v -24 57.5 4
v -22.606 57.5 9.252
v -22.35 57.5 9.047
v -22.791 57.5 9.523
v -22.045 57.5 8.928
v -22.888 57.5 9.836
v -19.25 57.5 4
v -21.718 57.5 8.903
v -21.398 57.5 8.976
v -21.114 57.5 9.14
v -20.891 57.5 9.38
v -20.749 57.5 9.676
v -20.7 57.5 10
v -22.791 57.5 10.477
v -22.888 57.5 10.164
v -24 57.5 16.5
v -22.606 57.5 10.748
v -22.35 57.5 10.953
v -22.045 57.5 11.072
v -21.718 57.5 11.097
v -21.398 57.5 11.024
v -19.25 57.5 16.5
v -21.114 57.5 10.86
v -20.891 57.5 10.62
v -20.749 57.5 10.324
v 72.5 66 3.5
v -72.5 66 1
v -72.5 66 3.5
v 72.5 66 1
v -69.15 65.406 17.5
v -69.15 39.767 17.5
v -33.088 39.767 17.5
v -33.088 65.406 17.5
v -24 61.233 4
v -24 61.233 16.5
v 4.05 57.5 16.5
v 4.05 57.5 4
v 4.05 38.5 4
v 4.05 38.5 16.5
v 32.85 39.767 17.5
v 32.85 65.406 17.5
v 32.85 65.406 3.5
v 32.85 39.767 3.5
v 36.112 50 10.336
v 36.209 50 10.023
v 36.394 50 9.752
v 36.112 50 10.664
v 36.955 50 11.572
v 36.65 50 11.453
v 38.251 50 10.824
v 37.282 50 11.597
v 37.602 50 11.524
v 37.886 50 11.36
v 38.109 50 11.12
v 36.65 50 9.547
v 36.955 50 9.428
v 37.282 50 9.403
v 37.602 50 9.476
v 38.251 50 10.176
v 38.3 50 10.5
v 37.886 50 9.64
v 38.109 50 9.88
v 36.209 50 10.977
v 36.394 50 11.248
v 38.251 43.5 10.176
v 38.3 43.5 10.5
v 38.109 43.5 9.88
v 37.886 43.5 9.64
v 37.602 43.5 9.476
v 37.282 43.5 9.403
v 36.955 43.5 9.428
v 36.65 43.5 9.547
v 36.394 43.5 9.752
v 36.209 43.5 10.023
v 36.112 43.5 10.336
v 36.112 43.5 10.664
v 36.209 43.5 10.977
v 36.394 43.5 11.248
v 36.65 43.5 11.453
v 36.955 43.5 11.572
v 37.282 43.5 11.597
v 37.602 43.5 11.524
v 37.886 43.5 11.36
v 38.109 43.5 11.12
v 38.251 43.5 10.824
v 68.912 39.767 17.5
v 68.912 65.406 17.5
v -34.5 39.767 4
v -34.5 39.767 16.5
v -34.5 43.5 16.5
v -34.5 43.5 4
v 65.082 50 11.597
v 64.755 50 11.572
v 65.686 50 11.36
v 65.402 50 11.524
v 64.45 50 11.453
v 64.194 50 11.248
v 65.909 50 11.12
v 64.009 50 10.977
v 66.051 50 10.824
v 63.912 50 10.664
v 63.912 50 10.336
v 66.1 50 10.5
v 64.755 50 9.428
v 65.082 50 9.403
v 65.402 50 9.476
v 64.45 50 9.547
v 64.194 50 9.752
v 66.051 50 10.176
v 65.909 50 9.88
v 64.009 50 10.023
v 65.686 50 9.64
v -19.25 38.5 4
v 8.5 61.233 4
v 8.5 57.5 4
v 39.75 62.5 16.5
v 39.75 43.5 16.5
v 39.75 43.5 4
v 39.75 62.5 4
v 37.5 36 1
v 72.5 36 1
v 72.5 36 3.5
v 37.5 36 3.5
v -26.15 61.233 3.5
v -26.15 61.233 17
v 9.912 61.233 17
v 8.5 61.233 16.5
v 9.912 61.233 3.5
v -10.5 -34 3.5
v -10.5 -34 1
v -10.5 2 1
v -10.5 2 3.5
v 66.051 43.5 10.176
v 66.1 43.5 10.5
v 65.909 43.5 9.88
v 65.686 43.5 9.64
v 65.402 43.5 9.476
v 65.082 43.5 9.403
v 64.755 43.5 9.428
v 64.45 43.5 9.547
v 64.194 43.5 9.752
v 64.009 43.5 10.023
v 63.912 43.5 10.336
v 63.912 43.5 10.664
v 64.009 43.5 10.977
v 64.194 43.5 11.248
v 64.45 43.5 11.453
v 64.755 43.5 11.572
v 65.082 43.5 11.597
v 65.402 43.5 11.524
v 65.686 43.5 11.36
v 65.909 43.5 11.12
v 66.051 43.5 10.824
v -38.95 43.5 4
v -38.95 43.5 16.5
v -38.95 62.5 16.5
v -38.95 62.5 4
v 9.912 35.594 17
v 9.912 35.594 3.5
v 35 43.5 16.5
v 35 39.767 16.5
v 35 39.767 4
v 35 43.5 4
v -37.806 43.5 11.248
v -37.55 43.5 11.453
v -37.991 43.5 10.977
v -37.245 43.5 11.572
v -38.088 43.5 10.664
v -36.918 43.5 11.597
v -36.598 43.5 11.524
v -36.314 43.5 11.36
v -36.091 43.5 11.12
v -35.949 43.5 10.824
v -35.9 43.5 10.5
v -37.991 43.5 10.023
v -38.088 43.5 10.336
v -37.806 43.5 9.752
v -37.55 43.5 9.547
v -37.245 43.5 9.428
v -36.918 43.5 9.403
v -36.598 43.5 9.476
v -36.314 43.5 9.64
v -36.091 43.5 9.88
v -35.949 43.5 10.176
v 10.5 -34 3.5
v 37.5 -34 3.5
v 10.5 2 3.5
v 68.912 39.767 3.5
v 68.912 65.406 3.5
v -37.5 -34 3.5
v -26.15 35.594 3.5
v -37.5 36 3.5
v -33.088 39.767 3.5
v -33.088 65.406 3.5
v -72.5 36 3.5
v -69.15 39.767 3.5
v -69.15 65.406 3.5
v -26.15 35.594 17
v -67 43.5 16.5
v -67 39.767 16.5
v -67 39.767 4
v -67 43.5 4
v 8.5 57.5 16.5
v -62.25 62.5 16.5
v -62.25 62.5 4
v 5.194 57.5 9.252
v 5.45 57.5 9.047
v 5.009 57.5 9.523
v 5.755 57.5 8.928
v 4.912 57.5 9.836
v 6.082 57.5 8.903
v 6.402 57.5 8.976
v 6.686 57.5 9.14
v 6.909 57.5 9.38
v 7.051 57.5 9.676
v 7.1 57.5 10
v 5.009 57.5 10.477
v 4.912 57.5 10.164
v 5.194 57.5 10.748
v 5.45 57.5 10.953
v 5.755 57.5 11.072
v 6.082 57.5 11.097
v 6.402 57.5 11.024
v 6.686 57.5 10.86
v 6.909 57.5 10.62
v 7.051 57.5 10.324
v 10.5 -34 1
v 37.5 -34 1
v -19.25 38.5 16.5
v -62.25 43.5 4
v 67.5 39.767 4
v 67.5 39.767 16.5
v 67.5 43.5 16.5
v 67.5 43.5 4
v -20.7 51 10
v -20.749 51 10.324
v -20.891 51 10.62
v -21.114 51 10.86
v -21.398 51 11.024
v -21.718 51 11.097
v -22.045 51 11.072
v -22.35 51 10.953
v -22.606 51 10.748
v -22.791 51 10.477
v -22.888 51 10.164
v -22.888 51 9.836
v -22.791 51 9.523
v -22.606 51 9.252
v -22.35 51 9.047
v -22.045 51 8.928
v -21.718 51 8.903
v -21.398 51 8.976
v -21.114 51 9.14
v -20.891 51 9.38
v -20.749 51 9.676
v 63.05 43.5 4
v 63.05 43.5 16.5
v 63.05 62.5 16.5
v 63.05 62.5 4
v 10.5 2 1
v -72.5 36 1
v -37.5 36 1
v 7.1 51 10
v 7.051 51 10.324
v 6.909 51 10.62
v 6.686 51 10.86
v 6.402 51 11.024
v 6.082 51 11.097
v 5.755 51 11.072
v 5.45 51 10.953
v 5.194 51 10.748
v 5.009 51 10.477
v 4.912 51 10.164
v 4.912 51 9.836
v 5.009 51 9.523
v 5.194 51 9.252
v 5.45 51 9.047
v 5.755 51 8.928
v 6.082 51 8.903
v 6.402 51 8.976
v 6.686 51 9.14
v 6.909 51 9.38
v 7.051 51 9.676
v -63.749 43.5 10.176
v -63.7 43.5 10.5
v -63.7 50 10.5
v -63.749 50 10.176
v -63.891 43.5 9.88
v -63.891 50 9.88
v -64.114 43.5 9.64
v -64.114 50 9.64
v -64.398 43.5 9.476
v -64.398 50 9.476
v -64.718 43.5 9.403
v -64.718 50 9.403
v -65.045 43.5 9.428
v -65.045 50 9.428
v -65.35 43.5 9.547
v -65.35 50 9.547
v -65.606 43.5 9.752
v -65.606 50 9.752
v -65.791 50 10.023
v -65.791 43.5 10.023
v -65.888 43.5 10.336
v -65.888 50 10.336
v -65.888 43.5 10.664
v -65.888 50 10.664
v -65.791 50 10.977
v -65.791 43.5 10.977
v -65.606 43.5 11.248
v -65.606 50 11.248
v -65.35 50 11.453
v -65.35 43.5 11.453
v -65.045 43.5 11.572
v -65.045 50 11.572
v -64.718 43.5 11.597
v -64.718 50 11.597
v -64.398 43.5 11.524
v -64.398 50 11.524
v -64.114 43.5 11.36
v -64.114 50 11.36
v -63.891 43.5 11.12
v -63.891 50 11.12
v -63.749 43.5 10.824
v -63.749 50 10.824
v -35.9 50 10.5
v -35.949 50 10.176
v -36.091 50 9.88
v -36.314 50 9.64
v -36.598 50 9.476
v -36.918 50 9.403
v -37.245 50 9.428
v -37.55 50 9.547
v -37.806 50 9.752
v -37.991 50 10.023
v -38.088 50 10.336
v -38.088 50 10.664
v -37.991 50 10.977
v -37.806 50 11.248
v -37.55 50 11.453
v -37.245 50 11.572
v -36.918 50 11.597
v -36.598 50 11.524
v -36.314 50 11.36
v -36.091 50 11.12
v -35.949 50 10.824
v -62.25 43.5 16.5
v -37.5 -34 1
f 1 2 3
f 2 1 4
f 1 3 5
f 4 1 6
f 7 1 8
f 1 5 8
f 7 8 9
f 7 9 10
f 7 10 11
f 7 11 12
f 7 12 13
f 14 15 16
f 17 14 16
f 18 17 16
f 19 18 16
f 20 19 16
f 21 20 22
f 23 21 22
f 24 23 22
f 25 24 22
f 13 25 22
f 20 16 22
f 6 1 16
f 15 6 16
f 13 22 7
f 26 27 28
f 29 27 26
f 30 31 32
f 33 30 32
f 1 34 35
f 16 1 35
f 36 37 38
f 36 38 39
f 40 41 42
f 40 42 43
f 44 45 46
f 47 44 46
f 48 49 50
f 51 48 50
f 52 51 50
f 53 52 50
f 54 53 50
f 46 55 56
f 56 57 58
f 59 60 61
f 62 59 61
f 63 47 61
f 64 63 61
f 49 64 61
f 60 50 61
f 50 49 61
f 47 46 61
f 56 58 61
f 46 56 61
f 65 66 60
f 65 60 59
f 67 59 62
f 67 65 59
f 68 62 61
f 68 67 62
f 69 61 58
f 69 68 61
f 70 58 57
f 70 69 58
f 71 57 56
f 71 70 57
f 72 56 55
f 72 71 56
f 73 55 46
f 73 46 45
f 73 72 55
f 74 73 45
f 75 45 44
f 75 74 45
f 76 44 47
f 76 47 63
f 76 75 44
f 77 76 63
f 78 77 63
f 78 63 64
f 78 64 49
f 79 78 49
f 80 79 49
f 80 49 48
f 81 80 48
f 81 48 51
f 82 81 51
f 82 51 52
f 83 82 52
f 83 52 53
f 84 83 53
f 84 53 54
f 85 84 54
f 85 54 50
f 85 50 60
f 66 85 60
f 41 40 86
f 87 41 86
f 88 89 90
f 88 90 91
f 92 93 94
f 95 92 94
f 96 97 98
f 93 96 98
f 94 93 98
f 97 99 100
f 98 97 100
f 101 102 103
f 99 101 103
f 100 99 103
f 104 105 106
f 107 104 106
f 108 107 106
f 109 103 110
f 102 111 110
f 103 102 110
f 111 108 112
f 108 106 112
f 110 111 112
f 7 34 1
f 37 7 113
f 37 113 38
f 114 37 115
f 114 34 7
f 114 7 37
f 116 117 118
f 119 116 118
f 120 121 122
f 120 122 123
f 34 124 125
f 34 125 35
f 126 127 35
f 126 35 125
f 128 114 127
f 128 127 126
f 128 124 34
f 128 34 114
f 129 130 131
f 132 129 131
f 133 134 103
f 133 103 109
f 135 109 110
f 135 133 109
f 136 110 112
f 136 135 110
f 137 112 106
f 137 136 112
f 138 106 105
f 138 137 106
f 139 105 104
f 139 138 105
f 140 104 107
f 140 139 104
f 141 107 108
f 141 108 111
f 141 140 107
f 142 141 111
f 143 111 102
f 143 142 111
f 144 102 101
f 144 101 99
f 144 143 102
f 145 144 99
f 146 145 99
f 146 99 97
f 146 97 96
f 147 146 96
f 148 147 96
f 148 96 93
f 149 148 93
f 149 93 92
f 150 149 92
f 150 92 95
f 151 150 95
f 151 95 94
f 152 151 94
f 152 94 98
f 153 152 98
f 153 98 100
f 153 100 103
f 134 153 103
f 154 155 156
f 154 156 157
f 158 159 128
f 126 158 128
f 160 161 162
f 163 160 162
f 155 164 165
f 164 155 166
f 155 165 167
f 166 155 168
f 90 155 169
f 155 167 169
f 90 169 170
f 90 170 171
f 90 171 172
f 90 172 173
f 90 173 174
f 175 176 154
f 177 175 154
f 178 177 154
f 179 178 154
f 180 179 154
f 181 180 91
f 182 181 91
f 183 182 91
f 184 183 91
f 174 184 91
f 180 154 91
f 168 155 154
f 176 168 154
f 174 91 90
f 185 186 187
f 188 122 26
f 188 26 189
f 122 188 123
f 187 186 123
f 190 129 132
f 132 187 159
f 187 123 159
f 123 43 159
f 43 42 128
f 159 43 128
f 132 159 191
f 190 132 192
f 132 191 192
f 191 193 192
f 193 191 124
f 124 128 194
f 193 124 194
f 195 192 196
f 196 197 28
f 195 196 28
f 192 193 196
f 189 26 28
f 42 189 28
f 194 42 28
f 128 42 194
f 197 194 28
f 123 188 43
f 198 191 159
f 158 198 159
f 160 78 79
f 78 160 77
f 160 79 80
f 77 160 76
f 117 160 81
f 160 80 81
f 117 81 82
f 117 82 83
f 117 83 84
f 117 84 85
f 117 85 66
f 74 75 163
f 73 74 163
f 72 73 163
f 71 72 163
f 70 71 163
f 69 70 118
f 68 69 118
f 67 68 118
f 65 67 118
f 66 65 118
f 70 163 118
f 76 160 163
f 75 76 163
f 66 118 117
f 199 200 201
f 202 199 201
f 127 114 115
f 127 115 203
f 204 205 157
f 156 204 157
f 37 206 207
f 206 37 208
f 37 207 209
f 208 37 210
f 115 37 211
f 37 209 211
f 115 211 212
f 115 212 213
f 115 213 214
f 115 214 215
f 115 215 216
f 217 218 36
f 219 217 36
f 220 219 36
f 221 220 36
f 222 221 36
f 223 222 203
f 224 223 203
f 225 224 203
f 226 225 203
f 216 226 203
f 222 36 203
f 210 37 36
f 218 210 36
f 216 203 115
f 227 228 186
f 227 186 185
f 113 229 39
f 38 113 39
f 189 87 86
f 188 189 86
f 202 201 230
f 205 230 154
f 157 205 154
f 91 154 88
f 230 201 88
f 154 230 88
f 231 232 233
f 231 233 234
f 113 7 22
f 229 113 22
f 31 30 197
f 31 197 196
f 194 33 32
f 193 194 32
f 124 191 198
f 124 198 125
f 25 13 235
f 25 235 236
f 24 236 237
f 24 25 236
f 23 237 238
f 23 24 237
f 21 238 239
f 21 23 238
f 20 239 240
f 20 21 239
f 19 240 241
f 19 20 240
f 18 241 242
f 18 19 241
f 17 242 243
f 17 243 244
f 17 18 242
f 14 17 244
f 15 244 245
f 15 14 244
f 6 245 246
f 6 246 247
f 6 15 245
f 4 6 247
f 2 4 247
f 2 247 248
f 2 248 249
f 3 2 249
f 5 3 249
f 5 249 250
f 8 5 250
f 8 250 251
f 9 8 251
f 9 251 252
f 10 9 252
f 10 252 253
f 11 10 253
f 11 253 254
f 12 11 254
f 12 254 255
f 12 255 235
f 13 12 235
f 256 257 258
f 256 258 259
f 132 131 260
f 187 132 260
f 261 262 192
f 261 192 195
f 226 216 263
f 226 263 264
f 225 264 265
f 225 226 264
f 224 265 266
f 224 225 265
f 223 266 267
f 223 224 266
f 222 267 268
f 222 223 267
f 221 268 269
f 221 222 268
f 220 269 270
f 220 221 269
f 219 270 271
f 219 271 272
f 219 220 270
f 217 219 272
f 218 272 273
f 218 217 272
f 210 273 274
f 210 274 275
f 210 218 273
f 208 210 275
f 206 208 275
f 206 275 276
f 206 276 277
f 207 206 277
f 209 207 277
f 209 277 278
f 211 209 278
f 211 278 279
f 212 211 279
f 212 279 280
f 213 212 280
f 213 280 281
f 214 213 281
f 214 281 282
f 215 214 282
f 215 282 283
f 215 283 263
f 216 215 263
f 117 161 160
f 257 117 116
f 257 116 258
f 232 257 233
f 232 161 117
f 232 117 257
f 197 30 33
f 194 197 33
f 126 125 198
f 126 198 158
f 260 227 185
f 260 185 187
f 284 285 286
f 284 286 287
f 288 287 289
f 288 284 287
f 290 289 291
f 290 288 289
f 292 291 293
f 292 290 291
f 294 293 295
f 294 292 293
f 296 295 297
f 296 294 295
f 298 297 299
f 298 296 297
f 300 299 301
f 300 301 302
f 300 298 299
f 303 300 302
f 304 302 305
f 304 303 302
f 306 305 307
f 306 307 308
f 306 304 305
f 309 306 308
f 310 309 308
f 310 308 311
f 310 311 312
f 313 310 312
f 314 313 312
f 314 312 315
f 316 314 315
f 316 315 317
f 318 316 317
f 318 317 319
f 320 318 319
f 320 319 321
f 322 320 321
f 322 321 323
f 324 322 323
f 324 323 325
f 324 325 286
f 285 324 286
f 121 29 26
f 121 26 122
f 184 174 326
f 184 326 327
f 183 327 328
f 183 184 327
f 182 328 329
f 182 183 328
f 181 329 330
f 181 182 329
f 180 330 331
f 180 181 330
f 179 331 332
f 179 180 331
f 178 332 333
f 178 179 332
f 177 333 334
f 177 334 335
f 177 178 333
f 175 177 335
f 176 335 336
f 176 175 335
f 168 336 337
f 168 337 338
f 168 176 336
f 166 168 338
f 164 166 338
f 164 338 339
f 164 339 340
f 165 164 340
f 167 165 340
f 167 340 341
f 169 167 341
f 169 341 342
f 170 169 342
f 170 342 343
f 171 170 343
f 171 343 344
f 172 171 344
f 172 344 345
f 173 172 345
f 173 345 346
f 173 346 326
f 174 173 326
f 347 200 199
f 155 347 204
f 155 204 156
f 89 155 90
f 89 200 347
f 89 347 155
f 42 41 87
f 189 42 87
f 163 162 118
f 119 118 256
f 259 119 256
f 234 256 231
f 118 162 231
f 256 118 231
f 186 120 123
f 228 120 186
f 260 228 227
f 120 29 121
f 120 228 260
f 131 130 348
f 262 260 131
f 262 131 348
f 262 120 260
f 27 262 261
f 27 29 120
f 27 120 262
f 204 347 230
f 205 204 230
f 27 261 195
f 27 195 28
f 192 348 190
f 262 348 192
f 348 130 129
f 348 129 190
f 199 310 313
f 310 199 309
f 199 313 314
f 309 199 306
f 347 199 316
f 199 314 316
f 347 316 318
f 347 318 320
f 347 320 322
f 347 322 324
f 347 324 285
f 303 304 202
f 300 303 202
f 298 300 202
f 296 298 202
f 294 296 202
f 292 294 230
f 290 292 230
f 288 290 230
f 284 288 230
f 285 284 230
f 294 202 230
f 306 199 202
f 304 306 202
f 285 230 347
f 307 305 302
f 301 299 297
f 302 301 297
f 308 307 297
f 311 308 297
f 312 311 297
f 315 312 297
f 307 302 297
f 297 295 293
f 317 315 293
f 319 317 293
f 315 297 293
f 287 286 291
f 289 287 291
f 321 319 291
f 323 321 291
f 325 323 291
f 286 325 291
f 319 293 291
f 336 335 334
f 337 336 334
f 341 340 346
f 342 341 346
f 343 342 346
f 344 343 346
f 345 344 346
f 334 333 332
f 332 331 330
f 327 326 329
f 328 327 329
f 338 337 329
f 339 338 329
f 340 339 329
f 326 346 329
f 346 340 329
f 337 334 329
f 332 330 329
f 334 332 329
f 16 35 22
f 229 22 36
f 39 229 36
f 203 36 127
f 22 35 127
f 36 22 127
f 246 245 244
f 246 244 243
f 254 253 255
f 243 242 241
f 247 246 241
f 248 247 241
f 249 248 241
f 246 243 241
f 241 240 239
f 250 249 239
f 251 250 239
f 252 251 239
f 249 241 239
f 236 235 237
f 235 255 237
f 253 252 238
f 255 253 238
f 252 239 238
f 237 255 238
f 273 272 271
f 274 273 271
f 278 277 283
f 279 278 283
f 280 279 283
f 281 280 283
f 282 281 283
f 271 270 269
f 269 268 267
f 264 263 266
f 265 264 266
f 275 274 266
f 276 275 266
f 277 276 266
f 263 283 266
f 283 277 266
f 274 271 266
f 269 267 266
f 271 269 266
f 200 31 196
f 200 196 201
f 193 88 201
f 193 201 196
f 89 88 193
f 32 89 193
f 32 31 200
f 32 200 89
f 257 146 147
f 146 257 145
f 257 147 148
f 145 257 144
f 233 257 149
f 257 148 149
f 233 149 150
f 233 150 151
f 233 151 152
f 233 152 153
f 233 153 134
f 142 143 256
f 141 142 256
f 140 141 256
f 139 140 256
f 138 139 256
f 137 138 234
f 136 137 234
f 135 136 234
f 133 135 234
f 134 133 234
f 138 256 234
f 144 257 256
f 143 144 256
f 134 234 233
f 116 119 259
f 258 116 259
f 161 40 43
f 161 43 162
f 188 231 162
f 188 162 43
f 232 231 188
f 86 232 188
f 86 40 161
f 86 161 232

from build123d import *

# Parameters (mm, degrees)
BOX006_W               = 21
BOX006_H               = 36
BOX006_DEPTH           = 10
CYLINDER013_R          = 1.1
CYLINDER013_DEPTH      = 10
CYLINDER014_R          = 1.1
CYLINDER014_DEPTH      = 10
SKETCH019_W            = 23.3
SKETCH019_H            = 12.5
PAD019_DEPTH           = 19.5
SKETCH017_W            = 32.5
SKETCH017_H            = 12.5
PAD018_DEPTH           = 4.5
SKETCH018_W            = 36.061928
SKETCH018_H            = 25.639376
PAD017_DEPTH           = 14
CYLINDER015_R          = 1.1
CYLINDER015_DEPTH      = 10
CYLINDER016_R          = 1.1
CYLINDER016_DEPTH      = 10
SKETCH022_W            = 23.3
SKETCH022_H            = 12.5
PAD022_DEPTH           = 19.5
SKETCH020_W            = 32.5
SKETCH020_H            = 12.5
PAD021_DEPTH           = 4.5
SKETCH021_W            = 36.061928
SKETCH021_H            = 25.639376
PAD020_DEPTH           = 14
CUT019_PLACEMENT_ANGLE = 180
CYLINDER017_R          = 1.1
CYLINDER017_DEPTH      = 10
CYLINDER018_R          = 1.1
CYLINDER018_DEPTH      = 10
SKETCH025_W            = 23.3
SKETCH025_H            = 12.5
PAD025_DEPTH           = 19.5
SKETCH023_W            = 32.5
SKETCH023_H            = 12.5
PAD024_DEPTH           = 4.5
SKETCH024_W            = 36.061928
SKETCH024_H            = 25.639376
PAD023_DEPTH           = 14
CUT022_PLACEMENT_ANGLE = 180
PAD016_DEPTH           = 2.5


with BuildPart() as cube006:
    # Box006 → Box006 (new body)
    with BuildSketch(Plane(origin=(-10.5, -34, 0), x_dir=(1, 0, 0), z_dir=(0, 0, 1))):
        with Locations((10.5, 18)):
            Rectangle(BOX006_W, BOX006_H)
    extrude(amount=BOX006_DEPTH)


with BuildPart() as cylinder013:
    # Cylinder013 → Cylinder013 (new body)
    with BuildSketch(Plane(origin=(30, 22, 6), x_dir=(1, 0, 0), z_dir=(0, -1, 0))):
        Circle(CYLINDER013_R)
    extrude(amount=CYLINDER013_DEPTH)


with BuildPart() as tornillossoporteservohollo002:
    # Cylinder014 → Cylinder014 (new body)
    with BuildSketch(Plane(origin=(2.2, 22, 6), x_dir=(1, 0, 0), z_dir=(0, -1, 0))):
        Circle(CYLINDER014_R)
    extrude(amount=CYLINDER014_DEPTH)

    # Fusion014: union Cylinder013
    add(cylinder013.part)


with BuildPart() as cortecuerpo002:
    # Sketch019 → Pad019 (new body)
    with BuildSketch(Plane.XZ):
        with Locations((16.4, 6.25)):
            Rectangle(SKETCH019_W, SKETCH019_H)
    extrude(amount=PAD019_DEPTH)


with BuildPart() as cortecuerpo002_1:
    # Body021 placement: moved
    add(cortecuerpo002.part.moved(Location((0, 19, 0))))


with BuildPart() as cortetornillos002:
    # Sketch017 → Pad018 (new body)
    with BuildSketch(Plane.XZ):
        with Locations((16.25, 6.25)):
            Rectangle(SKETCH017_W, SKETCH017_H)
    extrude(amount=PAD018_DEPTH)


with BuildPart() as cortetornillos002_1:
    # Body020 placement: moved
    add(cortetornillos002.part.moved(Location((0, 23, 0))))


with BuildPart() as soporteservocajamg90s001:
    # Sketch018 → Pad017 (new body)
    with BuildSketch(Plane.XY):
        with Locations((15.881367, 9.413649)):
            Rectangle(SKETCH018_W, SKETCH018_H)
    extrude(amount=PAD017_DEPTH)


with BuildPart() as soporteservocajamg90s001_1:
    # Body019 placement: moved
    add(soporteservocajamg90s001.part.moved(Location((0, 0, -1))))

    # Cut014: cut CorteTornillos002
    add(cortetornillos002_1.part, mode=Mode.SUBTRACT)

    # Cut015: cut CorteCuerpo002
    add(cortecuerpo002_1.part, mode=Mode.SUBTRACT)

    # Cut016: cut tornillosSoporteServoHollo002
    add(tornillossoporteservohollo002.part, mode=Mode.SUBTRACT)


with BuildPart() as soporteservocajamg90s001_2:
    # Cut016 placement: moved
    add(soporteservocajamg90s001_1.part.moved(Location((-24, 39, 4))))


with BuildPart() as cylinder015:
    # Cylinder015 → Cylinder015 (new body)
    with BuildSketch(Plane(origin=(30, 22, 6), x_dir=(1, 0, 0), z_dir=(0, -1, 0))):
        Circle(CYLINDER015_R)
    extrude(amount=CYLINDER015_DEPTH)


with BuildPart() as tornillossoporteservohollo003:
    # Cylinder016 → Cylinder016 (new body)
    with BuildSketch(Plane(origin=(2.2, 22, 6), x_dir=(1, 0, 0), z_dir=(0, -1, 0))):
        Circle(CYLINDER016_R)
    extrude(amount=CYLINDER016_DEPTH)

    # Fusion015: union Cylinder015
    add(cylinder015.part)


with BuildPart() as cortecuerpo003:
    # Sketch022 → Pad022 (new body)
    with BuildSketch(Plane.XZ):
        with Locations((16.4, 6.25)):
            Rectangle(SKETCH022_W, SKETCH022_H)
    extrude(amount=PAD022_DEPTH)


with BuildPart() as cortecuerpo003_1:
    # Body024 placement: moved
    add(cortecuerpo003.part.moved(Location((0, 19, 0))))


with BuildPart() as cortetornillos003:
    # Sketch020 → Pad021 (new body)
    with BuildSketch(Plane.XZ):
        with Locations((16.25, 6.25)):
            Rectangle(SKETCH020_W, SKETCH020_H)
    extrude(amount=PAD021_DEPTH)


with BuildPart() as cortetornillos003_1:
    # Body023 placement: moved
    add(cortetornillos003.part.moved(Location((0, 23, 0))))


with BuildPart() as soporteservocajamg90s002:
    # Sketch021 → Pad020 (new body)
    with BuildSketch(Plane.XY):
        with Locations((15.881367, 9.413649)):
            Rectangle(SKETCH021_W, SKETCH021_H)
    extrude(amount=PAD020_DEPTH)


with BuildPart() as soporteservocajamg90s002_1:
    # Body022 placement: moved
    add(soporteservocajamg90s002.part.moved(Location((0, 0, -1))))

    # Cut017: cut CorteTornillos003
    add(cortetornillos003_1.part, mode=Mode.SUBTRACT)

    # Cut018: cut CorteCuerpo003
    add(cortecuerpo003_1.part, mode=Mode.SUBTRACT)

    # Cut019: cut tornillosSoporteServoHollo003
    add(tornillossoporteservohollo003.part, mode=Mode.SUBTRACT)


with BuildPart() as soporteservocajamg90s002_2:
    # Cut019 placement: moved
    add(soporteservocajamg90s002_1.part.moved(Location((-67, 62, 16.5))).rotate(Axis((-67, 62, 16.5), (1, 0, 0)), CUT019_PLACEMENT_ANGLE))


with BuildPart() as cylinder017:
    # Cylinder017 → Cylinder017 (new body)
    with BuildSketch(Plane(origin=(30, 22, 6), x_dir=(1, 0, 0), z_dir=(0, -1, 0))):
        Circle(CYLINDER017_R)
    extrude(amount=CYLINDER017_DEPTH)


with BuildPart() as tornillossoporteservohollo004:
    # Cylinder018 → Cylinder018 (new body)
    with BuildSketch(Plane(origin=(2.2, 22, 6), x_dir=(1, 0, 0), z_dir=(0, -1, 0))):
        Circle(CYLINDER018_R)
    extrude(amount=CYLINDER018_DEPTH)

    # Fusion016: union Cylinder017
    add(cylinder017.part)


with BuildPart() as cortecuerpo004:
    # Sketch025 → Pad025 (new body)
    with BuildSketch(Plane.XZ):
        with Locations((16.4, 6.25)):
            Rectangle(SKETCH025_W, SKETCH025_H)
    extrude(amount=PAD025_DEPTH)


with BuildPart() as cortecuerpo004_1:
    # Body027 placement: moved
    add(cortecuerpo004.part.moved(Location((0, 19, 0))))


with BuildPart() as cortetornillos004:
    # Sketch023 → Pad024 (new body)
    with BuildSketch(Plane.XZ):
        with Locations((16.25, 6.25)):
            Rectangle(SKETCH023_W, SKETCH023_H)
    extrude(amount=PAD024_DEPTH)


with BuildPart() as cortetornillos004_1:
    # Body026 placement: moved
    add(cortetornillos004.part.moved(Location((0, 23, 0))))


with BuildPart() as soporteservocajamg90s003:
    # Sketch024 → Pad023 (new body)
    with BuildSketch(Plane.XY):
        with Locations((15.881367, 9.413649)):
            Rectangle(SKETCH024_W, SKETCH024_H)
    extrude(amount=PAD023_DEPTH)


with BuildPart() as soporteservocajamg90s003_1:
    # Body025 placement: moved
    add(soporteservocajamg90s003.part.moved(Location((0, 0, -1))))

    # Cut020: cut CorteTornillos004
    add(cortetornillos004_1.part, mode=Mode.SUBTRACT)

    # Cut021: cut CorteCuerpo004
    add(cortecuerpo004_1.part, mode=Mode.SUBTRACT)

    # Cut022: cut tornillosSoporteServoHollo004
    add(tornillossoporteservohollo004.part, mode=Mode.SUBTRACT)


with BuildPart() as soporteservocajamg90s003_2:
    # Cut022 placement: moved
    add(soporteservocajamg90s003_1.part.moved(Location((35, 62, 16.5))).rotate(Axis((35, 62, 16.5), (1, 0, 0)), CUT022_PLACEMENT_ANGLE))


with BuildPart() as cut031:
    # Sketch016 → Pad016 (new body)
    with BuildSketch(Plane.XY):
        Polygon((-72.5, 36), (-72.5, 66), (72.5, 66), (72.5, 36), (37.5, 36), (37.5, -34), (-37.5, -34), (-37.5, 36), align=None)
    extrude(amount=PAD016_DEPTH)


with BuildPart() as cut031_1:
    # Body018 placement: moved
    add(cut031.part.moved(Location((0, 0, 1))))

    # Fusion022: union SoporteServoCajaMG90S001, SoporteServoCajaMG90S002, SoporteServoCajaMG90S003
    add(soporteservocajamg90s001_2.part)
    add(soporteservocajamg90s002_2.part)
    add(soporteservocajamg90s003_2.part)

    # Cut031: cut Cube006
    add(cube006.part, mode=Mode.SUBTRACT)


solid = cut031_1.part
